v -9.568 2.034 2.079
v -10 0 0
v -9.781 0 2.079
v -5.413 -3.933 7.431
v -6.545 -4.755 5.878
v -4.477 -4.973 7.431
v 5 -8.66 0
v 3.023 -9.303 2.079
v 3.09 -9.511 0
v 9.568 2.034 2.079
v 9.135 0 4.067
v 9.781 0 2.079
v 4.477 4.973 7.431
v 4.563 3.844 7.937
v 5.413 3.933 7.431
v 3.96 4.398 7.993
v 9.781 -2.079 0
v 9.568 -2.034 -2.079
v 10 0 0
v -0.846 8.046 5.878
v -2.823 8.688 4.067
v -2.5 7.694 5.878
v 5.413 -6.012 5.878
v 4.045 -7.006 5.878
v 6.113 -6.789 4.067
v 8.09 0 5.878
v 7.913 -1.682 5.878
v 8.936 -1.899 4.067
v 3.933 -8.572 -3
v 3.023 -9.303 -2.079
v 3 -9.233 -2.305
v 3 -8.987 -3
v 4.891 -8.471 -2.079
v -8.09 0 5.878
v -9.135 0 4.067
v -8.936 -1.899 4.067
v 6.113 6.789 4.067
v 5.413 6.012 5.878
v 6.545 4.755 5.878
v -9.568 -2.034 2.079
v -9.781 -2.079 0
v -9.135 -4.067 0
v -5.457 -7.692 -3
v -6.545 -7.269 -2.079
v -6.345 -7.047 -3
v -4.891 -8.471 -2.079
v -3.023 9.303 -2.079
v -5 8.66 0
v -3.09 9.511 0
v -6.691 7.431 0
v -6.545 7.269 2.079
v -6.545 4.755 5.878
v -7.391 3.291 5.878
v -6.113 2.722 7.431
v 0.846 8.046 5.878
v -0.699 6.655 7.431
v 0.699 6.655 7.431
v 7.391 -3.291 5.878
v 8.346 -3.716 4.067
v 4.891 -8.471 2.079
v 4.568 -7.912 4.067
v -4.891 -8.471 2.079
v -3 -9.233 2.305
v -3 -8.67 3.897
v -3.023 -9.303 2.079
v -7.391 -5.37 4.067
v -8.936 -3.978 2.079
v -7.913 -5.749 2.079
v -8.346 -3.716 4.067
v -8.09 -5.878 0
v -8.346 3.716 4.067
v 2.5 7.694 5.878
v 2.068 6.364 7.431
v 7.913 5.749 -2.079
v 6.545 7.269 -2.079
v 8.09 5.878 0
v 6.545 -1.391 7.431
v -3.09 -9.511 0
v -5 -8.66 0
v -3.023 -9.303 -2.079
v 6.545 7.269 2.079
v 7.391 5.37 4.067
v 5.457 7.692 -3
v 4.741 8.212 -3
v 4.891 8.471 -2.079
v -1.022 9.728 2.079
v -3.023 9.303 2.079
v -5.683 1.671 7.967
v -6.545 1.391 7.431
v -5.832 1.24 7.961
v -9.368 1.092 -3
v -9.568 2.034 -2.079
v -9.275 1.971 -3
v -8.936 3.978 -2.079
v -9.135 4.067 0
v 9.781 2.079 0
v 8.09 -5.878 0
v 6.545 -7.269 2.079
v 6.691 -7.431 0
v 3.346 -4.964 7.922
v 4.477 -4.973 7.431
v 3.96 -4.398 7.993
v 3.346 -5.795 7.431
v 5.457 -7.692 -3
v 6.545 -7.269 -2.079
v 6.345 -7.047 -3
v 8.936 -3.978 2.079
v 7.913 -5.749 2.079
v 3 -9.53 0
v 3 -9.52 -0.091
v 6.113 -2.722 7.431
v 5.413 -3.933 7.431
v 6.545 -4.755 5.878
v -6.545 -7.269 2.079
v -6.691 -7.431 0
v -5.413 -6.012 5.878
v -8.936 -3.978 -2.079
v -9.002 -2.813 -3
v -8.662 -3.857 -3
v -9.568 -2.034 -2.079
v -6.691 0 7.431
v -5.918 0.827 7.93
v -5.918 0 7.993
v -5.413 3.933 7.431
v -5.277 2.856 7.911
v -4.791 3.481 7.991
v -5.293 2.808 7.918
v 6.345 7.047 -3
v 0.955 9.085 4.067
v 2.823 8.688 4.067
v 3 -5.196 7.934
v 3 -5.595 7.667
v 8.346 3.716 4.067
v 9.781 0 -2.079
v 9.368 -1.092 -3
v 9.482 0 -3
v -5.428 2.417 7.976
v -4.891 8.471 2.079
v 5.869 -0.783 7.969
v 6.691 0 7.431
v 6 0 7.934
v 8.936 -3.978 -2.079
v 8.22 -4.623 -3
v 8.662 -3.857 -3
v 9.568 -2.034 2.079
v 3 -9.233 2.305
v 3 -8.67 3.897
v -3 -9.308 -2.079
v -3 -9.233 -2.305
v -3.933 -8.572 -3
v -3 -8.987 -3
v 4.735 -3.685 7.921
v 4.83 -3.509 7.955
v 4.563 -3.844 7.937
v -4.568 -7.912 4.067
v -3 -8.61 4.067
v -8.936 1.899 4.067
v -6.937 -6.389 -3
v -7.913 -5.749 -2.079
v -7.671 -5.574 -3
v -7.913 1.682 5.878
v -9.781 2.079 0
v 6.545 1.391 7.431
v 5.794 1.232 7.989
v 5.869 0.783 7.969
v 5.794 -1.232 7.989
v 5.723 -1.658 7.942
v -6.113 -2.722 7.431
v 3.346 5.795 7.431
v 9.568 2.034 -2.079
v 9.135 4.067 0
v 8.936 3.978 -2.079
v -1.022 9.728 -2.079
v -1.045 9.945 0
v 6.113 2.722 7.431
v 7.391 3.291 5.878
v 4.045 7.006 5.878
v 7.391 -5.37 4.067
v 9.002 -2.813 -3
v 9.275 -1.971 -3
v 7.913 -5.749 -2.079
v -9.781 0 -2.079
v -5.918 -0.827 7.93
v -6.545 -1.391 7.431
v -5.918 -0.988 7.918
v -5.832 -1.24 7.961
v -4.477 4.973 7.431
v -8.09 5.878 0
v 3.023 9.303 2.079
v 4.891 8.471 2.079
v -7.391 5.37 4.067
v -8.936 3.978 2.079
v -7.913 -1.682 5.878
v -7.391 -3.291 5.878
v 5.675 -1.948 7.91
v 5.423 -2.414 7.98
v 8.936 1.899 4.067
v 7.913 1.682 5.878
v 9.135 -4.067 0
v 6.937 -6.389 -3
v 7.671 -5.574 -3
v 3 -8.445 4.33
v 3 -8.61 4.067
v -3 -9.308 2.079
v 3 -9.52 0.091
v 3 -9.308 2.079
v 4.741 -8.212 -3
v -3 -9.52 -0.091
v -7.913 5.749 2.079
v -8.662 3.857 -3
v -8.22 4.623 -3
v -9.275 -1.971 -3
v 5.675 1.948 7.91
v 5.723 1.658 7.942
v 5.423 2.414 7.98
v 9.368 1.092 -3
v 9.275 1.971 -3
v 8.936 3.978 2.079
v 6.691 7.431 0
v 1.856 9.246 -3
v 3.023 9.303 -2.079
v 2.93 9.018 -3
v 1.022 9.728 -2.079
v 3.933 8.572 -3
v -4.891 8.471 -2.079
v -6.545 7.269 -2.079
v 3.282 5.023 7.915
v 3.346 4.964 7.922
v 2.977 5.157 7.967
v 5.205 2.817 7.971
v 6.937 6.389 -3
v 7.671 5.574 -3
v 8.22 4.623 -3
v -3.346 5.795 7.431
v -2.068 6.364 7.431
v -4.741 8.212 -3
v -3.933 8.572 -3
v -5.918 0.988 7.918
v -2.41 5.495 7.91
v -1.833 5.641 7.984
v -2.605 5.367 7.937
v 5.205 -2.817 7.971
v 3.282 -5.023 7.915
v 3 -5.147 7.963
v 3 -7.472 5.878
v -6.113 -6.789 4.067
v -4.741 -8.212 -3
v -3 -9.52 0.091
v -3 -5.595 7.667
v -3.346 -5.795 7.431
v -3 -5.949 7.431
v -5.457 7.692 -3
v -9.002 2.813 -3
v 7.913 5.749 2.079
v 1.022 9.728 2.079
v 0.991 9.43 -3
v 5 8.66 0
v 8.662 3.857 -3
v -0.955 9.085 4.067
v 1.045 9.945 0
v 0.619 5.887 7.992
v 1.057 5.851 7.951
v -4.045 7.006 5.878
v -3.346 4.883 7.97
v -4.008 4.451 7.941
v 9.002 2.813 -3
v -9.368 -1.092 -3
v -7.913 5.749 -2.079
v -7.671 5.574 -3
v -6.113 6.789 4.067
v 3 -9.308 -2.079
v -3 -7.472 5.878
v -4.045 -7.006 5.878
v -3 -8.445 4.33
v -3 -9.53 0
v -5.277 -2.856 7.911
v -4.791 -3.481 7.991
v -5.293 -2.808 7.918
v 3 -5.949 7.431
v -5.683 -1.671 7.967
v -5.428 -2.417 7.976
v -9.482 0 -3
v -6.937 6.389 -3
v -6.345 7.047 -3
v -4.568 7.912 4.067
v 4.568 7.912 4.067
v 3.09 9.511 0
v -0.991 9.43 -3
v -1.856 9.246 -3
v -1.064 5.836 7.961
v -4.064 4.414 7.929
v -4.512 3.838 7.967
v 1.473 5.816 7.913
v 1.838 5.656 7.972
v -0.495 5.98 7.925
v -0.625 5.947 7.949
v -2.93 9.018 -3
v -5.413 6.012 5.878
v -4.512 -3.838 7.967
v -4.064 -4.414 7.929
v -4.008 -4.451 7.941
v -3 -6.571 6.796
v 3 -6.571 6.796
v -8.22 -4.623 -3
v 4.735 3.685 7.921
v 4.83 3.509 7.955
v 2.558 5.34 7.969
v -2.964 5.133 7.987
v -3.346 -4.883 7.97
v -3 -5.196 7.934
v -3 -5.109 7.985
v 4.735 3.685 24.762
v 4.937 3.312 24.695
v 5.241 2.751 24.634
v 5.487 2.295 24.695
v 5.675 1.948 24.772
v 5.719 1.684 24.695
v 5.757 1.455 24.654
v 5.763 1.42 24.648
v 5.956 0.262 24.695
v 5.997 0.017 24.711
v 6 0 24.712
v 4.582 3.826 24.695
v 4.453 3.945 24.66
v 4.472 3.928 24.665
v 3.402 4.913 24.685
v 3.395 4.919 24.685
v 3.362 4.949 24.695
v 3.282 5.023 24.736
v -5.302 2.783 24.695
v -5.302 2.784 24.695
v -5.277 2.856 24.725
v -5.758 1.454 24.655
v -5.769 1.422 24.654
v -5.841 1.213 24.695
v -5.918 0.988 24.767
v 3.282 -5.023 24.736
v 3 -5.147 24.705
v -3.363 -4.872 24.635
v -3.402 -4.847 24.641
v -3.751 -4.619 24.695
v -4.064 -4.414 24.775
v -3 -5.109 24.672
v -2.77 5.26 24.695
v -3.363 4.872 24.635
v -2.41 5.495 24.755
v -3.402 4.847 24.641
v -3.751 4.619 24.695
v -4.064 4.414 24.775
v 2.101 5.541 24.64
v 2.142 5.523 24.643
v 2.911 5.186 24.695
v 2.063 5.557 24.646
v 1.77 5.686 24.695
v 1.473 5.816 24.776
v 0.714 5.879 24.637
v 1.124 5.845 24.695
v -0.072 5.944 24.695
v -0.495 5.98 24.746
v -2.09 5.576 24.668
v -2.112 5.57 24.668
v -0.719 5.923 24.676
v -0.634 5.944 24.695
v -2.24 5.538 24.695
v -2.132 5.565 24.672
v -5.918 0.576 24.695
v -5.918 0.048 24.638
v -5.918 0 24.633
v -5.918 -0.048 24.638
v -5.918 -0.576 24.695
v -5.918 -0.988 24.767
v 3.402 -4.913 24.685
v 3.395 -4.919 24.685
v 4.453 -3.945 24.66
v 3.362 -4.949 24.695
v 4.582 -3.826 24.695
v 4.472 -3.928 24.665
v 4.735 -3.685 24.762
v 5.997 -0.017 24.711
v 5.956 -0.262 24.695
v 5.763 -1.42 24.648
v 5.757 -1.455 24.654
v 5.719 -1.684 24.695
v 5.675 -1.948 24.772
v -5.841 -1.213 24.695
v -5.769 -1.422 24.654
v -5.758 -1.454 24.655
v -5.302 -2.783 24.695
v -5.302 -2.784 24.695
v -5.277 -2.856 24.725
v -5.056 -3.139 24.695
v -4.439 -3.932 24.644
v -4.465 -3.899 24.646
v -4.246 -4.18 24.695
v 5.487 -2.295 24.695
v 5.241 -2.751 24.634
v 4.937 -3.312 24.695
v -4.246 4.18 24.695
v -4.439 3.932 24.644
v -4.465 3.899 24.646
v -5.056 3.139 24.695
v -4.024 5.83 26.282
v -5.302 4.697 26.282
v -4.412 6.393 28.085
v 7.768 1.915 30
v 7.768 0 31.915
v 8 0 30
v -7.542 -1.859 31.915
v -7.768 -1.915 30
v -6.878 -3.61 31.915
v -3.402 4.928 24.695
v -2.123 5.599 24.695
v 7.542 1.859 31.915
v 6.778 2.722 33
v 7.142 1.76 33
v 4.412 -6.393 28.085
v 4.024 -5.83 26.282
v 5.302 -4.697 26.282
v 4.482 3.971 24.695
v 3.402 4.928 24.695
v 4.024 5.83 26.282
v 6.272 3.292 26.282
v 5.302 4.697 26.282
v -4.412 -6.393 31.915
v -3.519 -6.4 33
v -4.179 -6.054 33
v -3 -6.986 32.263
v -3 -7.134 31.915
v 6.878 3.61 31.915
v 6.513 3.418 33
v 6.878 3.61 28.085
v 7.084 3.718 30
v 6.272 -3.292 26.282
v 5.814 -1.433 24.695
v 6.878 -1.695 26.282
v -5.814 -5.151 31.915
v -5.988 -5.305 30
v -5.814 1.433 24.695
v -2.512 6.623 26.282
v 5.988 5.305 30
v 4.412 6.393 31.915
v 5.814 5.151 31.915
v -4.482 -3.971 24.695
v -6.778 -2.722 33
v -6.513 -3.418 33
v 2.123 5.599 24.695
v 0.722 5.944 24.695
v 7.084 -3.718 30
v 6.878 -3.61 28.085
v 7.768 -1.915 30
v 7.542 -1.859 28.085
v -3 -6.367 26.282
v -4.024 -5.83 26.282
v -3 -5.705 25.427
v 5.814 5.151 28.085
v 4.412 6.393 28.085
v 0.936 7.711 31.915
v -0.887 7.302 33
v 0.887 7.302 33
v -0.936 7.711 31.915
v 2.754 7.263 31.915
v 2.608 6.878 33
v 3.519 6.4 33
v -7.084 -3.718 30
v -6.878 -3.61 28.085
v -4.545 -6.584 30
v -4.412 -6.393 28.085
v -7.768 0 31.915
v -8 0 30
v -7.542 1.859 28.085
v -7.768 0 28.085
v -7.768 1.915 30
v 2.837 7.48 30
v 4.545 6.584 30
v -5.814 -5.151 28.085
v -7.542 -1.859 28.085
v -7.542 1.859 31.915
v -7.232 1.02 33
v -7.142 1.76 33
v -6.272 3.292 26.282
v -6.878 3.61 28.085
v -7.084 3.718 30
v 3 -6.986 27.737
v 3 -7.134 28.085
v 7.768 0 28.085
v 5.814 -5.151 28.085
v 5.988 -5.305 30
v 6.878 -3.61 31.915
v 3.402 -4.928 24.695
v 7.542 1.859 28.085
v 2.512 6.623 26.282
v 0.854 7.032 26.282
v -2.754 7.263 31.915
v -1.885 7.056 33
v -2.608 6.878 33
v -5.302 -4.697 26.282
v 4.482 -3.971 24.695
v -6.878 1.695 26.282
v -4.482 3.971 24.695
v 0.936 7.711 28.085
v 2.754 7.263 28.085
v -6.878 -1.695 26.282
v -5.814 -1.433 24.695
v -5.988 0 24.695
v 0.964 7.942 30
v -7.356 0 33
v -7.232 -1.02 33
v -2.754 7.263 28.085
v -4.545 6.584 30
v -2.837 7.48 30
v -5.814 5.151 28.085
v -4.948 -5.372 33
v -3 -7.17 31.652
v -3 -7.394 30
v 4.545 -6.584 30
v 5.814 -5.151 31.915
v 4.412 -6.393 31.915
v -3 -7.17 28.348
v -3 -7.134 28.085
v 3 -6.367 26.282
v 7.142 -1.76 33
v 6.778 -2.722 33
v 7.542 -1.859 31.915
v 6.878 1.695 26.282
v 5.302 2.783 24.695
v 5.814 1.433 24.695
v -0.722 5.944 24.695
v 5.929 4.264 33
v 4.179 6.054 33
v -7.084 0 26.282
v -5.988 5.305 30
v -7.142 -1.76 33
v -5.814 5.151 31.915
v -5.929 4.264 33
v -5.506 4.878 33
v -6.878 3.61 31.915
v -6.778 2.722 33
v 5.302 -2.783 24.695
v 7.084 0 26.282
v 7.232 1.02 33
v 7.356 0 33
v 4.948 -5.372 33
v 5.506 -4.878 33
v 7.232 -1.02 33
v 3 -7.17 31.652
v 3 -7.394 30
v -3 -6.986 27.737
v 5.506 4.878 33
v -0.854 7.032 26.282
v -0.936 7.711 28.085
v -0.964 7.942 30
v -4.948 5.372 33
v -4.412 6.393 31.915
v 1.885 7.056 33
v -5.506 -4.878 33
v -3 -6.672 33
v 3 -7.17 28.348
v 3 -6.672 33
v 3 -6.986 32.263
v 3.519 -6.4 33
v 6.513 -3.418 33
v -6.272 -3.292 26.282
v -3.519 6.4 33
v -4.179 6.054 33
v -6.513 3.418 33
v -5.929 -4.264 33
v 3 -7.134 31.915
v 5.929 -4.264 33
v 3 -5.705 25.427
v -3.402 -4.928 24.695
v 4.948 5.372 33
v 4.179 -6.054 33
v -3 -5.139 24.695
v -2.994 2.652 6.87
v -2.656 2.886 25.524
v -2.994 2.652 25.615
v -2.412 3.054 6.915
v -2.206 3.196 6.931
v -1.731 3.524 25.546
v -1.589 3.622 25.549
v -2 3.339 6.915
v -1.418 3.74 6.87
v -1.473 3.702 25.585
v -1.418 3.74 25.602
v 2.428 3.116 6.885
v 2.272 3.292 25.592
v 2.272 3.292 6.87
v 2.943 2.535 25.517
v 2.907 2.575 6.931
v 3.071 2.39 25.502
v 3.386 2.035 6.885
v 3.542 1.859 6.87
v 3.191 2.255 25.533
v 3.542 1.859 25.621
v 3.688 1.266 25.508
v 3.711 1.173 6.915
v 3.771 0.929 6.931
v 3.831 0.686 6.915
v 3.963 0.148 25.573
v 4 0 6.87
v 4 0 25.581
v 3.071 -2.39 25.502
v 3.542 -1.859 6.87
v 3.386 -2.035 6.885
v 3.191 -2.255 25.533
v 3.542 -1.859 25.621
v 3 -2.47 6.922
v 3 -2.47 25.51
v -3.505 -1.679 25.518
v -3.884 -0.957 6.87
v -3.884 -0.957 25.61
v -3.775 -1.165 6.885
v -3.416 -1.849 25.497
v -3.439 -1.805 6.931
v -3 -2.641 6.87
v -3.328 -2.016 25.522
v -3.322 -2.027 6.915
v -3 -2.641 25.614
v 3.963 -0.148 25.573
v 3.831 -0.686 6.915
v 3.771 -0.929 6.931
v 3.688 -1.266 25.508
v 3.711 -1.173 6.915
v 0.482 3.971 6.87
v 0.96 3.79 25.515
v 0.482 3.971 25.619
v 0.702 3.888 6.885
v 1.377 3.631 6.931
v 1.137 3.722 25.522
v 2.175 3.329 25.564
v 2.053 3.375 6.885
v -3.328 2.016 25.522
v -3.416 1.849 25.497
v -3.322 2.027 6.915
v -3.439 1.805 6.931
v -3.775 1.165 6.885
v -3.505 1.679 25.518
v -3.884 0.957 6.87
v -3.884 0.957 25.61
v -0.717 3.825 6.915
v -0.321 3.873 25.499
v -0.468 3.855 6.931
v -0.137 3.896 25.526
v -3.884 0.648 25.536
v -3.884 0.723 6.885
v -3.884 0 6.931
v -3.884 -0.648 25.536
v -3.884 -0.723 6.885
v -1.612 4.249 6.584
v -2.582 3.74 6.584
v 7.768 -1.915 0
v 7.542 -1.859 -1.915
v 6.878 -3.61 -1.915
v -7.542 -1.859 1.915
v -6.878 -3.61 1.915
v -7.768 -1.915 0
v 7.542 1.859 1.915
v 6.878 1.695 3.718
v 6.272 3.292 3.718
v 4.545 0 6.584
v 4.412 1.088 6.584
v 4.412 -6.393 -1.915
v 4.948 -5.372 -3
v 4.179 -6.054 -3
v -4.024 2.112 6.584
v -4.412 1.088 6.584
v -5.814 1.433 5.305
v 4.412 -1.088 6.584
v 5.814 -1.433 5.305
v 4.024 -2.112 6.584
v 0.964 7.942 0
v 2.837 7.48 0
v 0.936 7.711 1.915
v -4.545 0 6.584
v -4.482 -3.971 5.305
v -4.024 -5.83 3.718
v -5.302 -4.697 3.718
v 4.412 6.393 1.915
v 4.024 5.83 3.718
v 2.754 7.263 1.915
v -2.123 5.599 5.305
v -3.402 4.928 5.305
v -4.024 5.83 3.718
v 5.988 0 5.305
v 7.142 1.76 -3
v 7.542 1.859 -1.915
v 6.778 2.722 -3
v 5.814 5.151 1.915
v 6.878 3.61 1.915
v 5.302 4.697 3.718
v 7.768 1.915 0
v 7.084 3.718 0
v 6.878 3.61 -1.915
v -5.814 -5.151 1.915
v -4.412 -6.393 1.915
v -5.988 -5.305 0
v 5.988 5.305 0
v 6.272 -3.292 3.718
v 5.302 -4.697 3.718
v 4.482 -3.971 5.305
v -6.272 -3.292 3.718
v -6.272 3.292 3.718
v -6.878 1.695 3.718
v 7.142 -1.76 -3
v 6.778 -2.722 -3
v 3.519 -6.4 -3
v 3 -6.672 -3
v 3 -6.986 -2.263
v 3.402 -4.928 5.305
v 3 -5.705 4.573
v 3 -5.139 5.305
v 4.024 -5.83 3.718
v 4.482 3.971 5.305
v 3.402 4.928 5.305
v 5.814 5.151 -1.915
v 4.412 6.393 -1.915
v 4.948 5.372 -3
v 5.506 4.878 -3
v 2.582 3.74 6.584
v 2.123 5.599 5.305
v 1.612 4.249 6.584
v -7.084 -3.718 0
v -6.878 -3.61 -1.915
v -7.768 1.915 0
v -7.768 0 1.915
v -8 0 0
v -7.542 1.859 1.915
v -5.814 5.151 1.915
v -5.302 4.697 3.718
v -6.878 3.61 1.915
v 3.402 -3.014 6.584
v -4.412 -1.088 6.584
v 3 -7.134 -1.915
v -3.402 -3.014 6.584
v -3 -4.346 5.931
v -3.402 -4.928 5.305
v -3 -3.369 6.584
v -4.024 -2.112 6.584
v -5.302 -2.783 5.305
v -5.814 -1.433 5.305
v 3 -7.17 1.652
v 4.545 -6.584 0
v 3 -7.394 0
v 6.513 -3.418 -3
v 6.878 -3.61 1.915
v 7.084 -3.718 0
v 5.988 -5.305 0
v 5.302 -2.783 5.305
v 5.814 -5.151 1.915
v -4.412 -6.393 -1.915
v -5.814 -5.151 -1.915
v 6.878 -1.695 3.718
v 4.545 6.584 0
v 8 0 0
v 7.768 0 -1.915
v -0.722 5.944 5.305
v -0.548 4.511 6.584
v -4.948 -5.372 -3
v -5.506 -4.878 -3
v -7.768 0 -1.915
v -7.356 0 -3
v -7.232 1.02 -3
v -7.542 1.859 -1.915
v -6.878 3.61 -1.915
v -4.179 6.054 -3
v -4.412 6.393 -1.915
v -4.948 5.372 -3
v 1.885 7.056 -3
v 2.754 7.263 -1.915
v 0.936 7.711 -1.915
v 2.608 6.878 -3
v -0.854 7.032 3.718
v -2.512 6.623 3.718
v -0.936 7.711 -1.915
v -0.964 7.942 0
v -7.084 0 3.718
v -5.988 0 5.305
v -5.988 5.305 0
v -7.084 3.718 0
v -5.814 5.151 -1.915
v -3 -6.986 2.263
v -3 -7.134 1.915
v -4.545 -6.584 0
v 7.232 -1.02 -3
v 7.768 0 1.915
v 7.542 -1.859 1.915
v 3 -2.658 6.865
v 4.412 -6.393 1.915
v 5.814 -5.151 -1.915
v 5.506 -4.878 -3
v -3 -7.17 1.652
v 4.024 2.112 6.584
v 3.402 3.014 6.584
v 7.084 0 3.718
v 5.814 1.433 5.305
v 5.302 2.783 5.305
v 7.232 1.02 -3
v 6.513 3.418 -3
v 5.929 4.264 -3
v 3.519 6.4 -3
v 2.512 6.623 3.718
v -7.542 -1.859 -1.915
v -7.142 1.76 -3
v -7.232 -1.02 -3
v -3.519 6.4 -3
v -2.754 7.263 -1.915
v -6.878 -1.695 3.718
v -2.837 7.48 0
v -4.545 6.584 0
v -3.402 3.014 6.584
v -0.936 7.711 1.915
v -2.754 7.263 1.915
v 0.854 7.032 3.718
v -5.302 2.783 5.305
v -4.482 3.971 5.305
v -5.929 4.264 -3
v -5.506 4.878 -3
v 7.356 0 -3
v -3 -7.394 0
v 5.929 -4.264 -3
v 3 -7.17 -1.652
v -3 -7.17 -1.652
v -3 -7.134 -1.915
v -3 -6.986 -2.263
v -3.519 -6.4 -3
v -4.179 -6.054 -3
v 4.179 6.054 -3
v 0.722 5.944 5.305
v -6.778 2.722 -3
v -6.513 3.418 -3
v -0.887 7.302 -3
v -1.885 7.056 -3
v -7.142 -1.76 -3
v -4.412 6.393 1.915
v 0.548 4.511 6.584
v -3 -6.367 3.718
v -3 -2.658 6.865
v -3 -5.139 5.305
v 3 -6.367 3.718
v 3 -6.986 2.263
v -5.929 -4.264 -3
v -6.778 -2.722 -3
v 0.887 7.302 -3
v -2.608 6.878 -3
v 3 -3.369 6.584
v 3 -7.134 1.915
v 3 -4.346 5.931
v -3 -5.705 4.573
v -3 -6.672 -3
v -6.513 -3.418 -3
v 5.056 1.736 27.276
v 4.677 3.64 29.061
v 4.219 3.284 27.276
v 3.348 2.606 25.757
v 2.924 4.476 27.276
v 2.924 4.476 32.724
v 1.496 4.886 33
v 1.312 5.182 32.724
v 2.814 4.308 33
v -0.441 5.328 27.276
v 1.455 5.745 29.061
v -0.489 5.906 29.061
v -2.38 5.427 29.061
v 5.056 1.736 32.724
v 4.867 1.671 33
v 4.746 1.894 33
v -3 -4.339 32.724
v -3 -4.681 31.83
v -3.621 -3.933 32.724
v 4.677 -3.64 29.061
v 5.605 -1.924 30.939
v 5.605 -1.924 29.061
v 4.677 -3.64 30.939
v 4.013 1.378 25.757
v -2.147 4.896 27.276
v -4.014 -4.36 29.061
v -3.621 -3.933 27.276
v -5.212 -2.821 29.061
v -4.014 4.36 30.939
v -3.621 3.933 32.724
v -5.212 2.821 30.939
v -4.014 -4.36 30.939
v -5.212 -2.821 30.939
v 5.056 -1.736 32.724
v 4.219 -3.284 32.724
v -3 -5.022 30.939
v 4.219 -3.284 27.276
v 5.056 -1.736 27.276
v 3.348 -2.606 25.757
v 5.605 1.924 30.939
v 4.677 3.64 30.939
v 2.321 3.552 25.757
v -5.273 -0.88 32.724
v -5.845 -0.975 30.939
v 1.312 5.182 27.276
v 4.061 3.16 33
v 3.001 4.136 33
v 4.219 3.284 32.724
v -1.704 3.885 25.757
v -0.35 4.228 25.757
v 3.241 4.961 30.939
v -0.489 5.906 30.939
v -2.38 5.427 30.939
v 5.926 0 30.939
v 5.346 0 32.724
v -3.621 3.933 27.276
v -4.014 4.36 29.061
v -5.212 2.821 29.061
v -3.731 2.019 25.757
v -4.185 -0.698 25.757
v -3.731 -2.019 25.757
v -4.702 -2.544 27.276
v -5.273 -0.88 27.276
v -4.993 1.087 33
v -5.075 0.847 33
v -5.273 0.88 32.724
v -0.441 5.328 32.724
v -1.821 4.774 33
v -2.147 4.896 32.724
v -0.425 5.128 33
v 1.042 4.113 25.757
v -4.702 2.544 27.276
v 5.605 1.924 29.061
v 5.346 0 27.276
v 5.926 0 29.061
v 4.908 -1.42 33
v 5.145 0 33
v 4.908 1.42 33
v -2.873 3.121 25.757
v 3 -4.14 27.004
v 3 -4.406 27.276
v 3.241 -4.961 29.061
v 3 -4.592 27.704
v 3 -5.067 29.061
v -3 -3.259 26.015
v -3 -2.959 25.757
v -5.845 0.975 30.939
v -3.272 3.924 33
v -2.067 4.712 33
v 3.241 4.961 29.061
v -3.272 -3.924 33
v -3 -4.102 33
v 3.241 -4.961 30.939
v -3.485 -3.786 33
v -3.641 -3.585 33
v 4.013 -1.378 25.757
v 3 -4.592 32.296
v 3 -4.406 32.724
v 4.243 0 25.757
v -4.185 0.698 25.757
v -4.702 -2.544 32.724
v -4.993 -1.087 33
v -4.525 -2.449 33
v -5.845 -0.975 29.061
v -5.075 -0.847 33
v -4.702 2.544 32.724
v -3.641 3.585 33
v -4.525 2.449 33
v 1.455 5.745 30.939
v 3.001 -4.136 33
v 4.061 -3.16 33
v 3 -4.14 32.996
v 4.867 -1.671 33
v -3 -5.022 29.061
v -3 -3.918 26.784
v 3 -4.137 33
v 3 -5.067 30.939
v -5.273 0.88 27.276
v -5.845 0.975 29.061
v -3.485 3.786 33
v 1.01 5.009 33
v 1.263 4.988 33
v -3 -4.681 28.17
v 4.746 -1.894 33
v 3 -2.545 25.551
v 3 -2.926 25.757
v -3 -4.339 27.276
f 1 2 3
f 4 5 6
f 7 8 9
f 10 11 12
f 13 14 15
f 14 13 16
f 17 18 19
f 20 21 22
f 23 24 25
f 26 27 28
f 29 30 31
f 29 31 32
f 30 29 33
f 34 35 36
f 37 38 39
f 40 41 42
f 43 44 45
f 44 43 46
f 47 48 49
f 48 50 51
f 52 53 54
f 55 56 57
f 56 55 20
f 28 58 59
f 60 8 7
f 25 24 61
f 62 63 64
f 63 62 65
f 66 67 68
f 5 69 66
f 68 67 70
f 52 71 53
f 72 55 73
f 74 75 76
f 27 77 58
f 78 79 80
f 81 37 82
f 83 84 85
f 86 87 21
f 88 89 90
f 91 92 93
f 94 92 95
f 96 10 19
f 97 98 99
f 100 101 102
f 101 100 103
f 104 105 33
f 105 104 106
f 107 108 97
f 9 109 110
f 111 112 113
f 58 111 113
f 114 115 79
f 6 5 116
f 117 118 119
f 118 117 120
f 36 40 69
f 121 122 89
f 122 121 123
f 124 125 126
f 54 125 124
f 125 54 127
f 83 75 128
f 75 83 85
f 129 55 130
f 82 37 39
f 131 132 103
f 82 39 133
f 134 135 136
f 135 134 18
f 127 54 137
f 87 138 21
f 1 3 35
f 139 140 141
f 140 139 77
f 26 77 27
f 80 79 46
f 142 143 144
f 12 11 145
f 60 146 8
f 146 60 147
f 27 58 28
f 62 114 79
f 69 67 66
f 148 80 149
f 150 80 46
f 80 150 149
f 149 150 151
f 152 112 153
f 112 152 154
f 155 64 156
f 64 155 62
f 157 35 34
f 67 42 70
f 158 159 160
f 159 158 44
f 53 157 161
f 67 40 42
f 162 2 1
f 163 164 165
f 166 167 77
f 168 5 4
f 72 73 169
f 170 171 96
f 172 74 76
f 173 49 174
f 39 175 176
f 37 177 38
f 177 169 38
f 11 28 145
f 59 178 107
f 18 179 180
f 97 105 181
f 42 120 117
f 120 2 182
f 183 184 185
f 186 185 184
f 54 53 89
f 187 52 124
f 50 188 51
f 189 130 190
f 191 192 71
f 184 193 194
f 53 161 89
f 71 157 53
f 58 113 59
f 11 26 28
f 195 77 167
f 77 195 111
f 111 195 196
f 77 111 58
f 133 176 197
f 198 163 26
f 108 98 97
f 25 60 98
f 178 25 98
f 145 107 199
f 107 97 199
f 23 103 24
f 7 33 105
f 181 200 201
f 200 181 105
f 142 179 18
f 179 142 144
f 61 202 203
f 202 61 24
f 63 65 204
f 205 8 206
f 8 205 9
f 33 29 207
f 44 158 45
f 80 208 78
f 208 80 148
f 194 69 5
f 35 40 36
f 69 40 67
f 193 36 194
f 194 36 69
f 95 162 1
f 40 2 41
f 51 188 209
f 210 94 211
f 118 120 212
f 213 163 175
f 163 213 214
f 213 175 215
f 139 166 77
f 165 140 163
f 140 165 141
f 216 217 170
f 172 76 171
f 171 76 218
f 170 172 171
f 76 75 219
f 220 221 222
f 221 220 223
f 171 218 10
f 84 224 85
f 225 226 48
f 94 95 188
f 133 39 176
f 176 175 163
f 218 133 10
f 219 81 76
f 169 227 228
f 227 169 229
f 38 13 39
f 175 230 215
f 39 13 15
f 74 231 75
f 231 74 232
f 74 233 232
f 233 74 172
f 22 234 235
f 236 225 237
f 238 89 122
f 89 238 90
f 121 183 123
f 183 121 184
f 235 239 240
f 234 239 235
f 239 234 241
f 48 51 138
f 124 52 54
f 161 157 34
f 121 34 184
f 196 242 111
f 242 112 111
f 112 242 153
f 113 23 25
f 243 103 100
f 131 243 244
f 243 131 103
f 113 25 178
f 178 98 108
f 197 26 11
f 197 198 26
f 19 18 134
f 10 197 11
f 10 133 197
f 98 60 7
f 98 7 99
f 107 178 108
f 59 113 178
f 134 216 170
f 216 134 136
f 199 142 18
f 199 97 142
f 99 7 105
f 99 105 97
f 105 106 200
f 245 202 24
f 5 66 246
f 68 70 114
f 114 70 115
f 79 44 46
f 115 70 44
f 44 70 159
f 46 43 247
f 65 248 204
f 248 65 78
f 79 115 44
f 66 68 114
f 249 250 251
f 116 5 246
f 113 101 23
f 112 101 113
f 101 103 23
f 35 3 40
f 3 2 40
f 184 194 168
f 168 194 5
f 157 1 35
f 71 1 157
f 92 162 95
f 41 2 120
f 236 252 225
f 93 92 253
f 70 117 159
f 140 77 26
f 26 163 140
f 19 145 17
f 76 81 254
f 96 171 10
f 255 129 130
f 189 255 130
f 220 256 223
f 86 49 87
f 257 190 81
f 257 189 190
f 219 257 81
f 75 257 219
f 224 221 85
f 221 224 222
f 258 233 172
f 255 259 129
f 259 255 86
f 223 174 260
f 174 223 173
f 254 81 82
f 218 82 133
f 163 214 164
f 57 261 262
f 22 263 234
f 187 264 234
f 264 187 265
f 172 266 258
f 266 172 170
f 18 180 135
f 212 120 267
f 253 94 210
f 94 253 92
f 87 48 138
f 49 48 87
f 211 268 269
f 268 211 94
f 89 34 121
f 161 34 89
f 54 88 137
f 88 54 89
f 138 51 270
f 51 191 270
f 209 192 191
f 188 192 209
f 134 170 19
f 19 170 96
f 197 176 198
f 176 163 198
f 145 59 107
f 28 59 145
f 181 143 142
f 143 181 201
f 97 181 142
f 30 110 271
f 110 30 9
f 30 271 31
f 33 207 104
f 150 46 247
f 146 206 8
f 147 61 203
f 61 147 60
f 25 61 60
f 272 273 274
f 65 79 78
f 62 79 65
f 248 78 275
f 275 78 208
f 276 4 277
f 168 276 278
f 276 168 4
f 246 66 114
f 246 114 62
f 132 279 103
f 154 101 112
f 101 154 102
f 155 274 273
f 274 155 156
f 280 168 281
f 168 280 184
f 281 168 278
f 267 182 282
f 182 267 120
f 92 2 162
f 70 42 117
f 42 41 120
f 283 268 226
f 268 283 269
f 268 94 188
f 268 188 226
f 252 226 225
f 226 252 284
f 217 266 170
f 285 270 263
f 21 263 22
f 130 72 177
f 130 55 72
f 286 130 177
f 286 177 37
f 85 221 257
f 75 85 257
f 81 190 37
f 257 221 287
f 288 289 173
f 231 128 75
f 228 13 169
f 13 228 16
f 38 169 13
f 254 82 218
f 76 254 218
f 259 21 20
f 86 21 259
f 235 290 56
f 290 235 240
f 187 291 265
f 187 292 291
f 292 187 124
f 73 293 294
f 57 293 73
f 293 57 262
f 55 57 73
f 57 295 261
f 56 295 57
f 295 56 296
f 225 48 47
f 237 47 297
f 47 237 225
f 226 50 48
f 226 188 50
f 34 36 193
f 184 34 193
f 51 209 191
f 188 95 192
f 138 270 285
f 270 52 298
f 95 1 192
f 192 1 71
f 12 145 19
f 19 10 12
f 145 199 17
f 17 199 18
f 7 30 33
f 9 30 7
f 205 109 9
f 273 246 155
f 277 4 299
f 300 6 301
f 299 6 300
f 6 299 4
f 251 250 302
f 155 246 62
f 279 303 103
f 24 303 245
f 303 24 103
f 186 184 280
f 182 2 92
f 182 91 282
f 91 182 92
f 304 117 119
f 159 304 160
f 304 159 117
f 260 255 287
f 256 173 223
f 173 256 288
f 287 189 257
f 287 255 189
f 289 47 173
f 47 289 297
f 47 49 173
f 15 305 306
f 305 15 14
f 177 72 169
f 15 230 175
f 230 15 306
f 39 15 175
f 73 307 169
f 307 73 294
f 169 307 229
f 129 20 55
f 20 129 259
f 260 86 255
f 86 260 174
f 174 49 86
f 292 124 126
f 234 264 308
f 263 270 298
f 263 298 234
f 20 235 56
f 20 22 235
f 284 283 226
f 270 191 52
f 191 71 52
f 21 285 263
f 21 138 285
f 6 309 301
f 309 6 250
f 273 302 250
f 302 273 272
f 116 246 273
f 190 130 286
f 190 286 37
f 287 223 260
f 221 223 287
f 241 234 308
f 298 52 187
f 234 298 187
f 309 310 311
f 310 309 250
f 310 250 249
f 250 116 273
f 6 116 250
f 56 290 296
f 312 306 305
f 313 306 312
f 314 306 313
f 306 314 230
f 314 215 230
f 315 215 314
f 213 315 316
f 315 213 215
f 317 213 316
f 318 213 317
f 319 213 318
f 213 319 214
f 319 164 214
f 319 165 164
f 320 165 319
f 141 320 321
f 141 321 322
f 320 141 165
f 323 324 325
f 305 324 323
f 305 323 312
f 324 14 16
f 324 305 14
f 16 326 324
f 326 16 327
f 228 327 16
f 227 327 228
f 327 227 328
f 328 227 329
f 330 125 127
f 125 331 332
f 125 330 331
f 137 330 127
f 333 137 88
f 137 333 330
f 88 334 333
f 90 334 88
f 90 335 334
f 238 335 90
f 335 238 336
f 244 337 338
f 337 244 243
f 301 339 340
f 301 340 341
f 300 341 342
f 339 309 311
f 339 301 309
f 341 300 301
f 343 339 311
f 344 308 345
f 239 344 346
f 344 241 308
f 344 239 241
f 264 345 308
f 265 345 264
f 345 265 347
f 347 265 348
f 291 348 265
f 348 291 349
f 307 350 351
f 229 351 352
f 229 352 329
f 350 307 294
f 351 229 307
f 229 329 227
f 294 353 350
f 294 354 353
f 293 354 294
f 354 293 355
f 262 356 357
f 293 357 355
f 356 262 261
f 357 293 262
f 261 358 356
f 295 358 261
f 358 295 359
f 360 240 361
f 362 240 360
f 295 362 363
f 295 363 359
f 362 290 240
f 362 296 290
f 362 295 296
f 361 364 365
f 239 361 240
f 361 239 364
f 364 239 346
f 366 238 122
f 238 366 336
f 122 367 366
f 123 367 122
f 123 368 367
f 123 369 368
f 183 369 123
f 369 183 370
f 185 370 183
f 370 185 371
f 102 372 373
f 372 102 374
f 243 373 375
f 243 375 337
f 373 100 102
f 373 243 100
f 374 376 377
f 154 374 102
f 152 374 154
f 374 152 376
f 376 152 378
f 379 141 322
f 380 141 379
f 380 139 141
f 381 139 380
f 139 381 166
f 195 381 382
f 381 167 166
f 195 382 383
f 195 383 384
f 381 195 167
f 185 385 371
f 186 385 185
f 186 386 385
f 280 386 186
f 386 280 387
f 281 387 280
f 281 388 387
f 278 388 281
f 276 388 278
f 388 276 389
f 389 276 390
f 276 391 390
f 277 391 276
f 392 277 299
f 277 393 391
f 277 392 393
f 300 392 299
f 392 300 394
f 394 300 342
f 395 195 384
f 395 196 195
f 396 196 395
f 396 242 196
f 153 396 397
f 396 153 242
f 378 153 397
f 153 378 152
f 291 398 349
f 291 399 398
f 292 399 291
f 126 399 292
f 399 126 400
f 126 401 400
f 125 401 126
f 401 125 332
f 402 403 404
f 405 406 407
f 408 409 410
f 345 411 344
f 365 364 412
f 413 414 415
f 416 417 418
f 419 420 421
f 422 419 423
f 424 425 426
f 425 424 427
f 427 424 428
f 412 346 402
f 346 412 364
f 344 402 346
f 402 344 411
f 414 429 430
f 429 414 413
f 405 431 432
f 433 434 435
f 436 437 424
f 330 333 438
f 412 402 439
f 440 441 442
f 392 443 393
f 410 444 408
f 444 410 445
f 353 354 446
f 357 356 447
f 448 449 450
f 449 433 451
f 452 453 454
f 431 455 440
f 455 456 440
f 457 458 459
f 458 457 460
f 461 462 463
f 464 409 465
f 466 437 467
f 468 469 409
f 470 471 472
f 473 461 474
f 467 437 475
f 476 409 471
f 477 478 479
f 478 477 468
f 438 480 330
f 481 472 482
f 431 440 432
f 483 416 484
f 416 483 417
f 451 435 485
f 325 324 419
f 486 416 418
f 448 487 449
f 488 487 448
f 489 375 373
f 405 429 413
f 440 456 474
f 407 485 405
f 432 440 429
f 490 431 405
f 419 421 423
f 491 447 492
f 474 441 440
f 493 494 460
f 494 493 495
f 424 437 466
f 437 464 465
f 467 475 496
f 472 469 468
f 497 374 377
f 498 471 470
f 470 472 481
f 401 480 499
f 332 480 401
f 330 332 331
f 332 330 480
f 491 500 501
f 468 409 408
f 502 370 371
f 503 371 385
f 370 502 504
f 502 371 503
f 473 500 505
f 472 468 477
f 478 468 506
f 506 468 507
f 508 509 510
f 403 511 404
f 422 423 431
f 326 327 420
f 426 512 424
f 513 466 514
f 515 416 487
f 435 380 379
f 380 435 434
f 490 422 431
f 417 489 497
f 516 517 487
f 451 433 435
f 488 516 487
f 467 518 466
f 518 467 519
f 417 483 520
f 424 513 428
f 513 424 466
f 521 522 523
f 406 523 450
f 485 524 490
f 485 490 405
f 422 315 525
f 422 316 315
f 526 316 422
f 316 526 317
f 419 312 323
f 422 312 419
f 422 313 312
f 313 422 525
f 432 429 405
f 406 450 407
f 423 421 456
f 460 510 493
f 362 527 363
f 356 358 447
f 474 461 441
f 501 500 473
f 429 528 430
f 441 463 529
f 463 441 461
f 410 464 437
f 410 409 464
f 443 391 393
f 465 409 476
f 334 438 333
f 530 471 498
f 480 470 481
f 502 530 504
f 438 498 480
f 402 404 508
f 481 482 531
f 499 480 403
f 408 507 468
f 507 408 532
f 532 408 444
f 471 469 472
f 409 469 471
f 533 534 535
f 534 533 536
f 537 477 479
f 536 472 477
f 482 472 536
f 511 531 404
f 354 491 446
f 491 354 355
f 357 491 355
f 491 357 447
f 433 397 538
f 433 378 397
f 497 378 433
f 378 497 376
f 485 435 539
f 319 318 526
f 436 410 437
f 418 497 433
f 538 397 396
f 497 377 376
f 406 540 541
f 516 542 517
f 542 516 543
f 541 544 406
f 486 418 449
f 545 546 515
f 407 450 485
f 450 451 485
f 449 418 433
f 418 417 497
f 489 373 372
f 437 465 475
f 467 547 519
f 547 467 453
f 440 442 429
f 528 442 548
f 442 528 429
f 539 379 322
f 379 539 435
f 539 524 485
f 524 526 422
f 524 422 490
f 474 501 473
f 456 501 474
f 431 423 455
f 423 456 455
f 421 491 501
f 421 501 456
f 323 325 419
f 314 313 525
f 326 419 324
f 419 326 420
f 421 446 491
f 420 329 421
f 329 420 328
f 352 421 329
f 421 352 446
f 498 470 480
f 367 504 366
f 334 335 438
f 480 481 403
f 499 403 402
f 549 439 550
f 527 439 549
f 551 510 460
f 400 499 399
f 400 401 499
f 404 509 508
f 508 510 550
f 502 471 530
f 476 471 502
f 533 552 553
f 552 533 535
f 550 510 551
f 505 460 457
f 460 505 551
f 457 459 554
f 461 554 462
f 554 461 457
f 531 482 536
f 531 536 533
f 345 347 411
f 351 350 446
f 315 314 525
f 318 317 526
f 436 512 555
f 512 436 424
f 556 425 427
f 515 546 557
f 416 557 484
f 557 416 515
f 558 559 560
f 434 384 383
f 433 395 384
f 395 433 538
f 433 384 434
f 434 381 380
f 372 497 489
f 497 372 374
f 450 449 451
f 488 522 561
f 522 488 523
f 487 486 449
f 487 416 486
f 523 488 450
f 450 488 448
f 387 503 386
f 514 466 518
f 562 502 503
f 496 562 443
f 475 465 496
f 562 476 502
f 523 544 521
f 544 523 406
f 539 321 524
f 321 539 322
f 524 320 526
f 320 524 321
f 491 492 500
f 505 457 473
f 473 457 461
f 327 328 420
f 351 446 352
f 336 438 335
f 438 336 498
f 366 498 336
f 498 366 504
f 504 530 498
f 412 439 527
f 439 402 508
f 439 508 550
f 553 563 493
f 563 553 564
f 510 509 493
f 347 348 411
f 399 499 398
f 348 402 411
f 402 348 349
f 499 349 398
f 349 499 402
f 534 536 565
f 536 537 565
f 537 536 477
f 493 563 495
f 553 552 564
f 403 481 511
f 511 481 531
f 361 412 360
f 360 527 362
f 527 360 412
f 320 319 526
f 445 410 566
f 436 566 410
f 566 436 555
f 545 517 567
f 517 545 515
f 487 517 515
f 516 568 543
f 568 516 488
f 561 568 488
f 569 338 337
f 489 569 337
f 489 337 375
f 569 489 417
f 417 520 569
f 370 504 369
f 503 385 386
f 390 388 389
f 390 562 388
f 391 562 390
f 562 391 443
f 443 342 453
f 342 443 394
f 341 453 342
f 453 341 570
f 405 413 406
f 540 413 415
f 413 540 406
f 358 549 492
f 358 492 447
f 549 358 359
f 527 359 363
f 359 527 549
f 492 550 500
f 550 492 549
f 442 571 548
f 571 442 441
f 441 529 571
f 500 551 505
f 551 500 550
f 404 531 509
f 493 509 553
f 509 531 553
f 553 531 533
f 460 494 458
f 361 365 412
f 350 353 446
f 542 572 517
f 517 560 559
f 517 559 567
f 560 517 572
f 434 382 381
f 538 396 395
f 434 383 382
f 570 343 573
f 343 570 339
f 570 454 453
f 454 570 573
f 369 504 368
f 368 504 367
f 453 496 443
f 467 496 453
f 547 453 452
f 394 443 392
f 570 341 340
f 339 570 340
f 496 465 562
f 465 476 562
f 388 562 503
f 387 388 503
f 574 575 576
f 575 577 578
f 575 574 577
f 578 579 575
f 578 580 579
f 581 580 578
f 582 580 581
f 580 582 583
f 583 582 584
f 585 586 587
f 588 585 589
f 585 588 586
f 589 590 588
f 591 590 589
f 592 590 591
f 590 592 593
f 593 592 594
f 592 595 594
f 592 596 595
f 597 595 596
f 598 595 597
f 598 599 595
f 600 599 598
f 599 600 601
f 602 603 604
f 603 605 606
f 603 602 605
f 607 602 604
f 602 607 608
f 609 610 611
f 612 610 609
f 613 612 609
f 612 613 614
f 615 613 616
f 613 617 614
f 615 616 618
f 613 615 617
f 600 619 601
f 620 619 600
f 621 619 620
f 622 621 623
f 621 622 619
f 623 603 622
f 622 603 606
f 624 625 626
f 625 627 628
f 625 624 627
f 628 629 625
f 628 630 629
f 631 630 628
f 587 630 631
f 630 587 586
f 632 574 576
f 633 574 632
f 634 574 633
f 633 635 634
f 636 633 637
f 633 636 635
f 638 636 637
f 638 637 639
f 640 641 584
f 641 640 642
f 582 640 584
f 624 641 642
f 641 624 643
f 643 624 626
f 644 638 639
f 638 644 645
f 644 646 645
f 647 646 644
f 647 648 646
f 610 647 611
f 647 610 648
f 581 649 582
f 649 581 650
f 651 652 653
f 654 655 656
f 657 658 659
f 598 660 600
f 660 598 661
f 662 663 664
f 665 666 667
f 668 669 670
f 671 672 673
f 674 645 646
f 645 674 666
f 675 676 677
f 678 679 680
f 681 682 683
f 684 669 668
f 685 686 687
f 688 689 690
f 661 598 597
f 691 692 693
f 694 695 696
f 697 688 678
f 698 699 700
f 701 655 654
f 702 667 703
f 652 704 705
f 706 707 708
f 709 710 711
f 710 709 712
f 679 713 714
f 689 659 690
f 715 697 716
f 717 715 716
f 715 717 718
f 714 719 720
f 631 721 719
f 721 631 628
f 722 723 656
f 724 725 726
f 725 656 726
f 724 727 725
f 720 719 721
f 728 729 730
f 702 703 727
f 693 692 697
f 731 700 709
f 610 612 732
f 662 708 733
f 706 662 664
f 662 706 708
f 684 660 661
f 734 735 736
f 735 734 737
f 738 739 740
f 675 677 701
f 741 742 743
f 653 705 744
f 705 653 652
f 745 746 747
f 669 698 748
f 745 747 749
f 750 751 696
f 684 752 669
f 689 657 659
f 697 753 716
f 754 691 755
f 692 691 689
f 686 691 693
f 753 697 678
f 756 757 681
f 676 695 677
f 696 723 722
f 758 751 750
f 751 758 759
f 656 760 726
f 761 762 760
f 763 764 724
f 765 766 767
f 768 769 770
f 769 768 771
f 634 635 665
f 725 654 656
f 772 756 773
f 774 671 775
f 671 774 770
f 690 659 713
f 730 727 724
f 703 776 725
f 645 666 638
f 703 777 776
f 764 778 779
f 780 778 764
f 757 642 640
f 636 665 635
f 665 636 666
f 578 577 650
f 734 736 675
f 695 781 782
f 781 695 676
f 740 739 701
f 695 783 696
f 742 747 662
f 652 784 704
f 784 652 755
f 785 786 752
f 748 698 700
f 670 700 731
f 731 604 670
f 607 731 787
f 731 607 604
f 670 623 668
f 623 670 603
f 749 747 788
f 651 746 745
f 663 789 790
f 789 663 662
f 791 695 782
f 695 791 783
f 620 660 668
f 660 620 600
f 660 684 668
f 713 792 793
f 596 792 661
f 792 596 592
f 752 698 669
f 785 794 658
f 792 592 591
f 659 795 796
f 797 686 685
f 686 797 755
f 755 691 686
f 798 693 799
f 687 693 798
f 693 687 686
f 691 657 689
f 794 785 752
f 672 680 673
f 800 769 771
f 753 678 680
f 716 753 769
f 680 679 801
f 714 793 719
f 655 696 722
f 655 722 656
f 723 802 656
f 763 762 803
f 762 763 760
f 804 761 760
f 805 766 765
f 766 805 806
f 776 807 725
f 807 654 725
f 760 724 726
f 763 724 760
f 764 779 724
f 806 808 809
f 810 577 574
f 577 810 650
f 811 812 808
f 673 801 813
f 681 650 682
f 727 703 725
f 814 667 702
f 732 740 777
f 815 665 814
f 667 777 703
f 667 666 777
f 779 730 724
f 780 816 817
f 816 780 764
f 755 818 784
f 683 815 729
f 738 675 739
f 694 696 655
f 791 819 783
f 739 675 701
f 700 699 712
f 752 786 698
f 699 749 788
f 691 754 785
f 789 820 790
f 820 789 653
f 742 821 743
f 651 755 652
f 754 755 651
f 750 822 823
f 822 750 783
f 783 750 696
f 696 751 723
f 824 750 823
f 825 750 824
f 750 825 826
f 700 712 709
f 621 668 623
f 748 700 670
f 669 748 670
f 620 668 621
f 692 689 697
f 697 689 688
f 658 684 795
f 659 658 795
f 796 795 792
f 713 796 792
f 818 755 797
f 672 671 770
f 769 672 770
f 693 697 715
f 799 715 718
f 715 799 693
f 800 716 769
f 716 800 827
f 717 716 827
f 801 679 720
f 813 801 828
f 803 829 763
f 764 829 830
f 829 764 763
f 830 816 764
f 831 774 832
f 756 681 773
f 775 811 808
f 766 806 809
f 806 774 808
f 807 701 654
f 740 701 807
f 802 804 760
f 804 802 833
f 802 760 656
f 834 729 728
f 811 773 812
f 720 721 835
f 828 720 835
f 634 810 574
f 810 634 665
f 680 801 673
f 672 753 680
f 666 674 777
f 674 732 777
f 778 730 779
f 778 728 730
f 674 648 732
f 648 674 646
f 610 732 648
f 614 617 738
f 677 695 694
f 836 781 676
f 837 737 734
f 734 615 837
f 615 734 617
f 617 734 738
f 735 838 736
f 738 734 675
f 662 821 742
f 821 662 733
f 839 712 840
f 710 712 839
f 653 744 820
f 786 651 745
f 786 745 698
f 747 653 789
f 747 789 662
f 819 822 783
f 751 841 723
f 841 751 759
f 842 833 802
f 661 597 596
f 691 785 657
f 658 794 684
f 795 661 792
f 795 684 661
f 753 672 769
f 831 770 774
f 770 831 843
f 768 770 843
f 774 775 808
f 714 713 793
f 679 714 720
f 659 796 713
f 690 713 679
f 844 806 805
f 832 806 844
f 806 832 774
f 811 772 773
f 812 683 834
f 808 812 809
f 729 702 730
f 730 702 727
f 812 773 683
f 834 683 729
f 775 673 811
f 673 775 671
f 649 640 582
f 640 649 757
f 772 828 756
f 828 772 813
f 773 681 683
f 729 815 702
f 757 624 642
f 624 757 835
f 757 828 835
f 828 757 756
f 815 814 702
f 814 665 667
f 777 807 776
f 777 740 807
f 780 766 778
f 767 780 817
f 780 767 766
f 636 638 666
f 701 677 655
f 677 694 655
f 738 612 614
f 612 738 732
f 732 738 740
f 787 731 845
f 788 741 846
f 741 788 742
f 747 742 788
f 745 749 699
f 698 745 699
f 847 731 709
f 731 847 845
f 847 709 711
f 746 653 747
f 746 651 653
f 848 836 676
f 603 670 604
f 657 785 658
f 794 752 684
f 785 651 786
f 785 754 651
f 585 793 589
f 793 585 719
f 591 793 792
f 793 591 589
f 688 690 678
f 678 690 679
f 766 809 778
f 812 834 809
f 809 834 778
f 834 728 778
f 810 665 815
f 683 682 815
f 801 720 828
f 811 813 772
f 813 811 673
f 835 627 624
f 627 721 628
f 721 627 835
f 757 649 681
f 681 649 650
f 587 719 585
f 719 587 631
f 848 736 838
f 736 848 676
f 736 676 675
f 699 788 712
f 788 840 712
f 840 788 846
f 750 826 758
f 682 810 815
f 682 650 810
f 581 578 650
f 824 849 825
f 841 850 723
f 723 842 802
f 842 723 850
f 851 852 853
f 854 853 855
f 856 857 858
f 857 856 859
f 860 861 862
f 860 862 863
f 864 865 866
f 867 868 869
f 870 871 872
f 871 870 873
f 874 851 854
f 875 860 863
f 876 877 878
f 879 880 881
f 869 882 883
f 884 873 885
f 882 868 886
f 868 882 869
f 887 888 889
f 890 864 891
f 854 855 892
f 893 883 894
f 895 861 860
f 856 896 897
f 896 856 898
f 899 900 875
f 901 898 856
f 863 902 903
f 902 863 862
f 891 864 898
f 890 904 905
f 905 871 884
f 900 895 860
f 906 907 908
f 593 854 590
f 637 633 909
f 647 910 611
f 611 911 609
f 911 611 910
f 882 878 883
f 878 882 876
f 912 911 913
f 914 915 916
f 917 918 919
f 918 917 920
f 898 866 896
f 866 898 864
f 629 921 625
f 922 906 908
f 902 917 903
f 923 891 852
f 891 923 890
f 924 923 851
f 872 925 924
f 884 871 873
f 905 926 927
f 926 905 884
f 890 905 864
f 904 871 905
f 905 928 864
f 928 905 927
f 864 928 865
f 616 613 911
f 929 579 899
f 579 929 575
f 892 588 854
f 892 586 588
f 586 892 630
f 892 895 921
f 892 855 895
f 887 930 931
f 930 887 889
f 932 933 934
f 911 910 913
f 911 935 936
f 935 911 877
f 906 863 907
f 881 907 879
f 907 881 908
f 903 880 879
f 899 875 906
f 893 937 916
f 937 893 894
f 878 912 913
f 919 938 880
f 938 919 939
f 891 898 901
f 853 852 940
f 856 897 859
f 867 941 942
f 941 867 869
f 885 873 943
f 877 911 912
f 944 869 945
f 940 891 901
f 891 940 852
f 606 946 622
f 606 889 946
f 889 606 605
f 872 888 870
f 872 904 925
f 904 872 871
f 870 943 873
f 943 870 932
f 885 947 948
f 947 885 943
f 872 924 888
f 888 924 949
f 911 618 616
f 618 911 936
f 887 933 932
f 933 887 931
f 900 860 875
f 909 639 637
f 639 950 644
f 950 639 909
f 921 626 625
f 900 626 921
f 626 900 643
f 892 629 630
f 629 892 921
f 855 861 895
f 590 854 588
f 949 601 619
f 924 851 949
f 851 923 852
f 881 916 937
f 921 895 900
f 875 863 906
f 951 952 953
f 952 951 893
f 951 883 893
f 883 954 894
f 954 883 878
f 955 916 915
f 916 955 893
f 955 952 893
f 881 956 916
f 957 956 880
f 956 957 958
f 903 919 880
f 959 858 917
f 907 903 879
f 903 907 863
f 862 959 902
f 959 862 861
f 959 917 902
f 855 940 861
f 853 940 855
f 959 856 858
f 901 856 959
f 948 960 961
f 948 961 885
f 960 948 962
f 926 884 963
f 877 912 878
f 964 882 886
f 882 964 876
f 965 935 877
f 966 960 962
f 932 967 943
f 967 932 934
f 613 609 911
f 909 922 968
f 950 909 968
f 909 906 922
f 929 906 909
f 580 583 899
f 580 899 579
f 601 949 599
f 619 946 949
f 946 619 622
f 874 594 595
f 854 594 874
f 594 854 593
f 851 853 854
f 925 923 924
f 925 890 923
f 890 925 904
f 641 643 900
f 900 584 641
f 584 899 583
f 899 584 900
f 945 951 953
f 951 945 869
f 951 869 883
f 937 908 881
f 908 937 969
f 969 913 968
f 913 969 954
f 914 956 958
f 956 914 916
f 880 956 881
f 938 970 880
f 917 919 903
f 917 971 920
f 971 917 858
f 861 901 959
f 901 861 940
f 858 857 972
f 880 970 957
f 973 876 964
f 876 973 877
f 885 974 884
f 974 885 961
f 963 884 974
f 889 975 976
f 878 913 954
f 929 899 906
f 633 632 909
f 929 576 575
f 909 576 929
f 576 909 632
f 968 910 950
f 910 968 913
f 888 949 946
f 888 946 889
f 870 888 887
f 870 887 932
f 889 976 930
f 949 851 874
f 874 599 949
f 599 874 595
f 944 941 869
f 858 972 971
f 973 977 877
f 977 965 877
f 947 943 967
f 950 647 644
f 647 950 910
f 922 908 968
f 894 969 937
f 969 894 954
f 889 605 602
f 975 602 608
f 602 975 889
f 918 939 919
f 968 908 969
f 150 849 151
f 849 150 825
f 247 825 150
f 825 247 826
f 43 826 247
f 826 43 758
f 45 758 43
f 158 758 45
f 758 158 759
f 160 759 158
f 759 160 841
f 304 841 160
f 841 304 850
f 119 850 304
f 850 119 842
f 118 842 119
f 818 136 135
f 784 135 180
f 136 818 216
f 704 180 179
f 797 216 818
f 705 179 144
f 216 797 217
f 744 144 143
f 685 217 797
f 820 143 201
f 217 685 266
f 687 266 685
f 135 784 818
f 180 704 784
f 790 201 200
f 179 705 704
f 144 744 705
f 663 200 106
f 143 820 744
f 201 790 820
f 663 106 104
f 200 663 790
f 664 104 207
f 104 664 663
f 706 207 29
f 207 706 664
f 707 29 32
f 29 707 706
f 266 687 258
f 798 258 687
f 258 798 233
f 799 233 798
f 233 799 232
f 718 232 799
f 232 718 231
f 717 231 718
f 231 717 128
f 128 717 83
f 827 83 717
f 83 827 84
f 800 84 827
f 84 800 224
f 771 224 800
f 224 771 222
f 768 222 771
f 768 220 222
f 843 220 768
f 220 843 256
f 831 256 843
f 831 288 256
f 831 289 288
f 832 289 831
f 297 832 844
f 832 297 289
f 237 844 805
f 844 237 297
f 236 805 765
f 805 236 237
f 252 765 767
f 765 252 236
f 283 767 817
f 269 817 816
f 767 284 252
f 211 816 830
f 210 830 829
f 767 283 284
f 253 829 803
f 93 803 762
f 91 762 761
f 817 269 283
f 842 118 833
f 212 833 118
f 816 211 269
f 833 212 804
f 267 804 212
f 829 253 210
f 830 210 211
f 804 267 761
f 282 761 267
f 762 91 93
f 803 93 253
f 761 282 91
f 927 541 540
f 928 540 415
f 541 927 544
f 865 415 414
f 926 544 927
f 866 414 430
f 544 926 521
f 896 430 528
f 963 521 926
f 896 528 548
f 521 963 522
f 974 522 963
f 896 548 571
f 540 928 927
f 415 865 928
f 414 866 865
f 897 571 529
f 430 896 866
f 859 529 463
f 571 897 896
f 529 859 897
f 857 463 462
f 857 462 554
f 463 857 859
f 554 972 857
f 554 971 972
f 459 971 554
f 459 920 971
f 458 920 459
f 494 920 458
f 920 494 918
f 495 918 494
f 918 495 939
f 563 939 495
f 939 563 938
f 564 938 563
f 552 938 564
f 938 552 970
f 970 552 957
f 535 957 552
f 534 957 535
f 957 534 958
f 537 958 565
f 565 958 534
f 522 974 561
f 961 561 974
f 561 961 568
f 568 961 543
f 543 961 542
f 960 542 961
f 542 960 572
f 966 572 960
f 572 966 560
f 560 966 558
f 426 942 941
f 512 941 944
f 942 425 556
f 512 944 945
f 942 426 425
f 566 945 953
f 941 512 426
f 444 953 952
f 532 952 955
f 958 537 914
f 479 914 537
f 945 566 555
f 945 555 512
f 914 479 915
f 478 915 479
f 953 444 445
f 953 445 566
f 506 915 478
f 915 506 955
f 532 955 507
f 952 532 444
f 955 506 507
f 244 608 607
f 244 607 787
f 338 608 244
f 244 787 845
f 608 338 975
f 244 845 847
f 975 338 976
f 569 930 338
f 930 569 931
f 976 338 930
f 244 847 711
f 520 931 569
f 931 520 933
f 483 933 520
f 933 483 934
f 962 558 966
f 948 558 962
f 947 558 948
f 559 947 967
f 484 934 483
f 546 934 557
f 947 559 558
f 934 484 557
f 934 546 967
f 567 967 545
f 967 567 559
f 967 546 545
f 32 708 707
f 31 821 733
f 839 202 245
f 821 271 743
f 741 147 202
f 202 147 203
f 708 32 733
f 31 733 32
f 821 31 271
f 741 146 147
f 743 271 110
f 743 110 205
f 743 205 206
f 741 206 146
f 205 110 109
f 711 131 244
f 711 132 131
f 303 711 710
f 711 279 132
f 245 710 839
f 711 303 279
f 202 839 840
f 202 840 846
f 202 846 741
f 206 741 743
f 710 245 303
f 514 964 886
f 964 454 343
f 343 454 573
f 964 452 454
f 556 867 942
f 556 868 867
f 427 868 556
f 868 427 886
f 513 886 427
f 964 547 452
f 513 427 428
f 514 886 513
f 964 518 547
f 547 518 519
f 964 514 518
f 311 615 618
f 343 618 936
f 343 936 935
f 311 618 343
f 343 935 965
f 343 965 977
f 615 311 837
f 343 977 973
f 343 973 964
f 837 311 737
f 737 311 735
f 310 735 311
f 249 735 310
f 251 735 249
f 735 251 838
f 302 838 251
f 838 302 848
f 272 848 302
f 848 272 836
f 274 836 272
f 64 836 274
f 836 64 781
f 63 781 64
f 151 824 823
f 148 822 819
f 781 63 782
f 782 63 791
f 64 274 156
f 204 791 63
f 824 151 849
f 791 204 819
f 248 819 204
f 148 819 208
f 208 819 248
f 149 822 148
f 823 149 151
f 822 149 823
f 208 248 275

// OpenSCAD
//This is the height from the center of the large ball to the cente of the small ball, not the overall height of the object.
//Height of the shaft, not the full object
height=30; //[10:50]

//This is the reidus of the inner pipe (The amount of space you have to run cables.
//Inner Pipe radius
inner_pipe_radius=4;//[2:10] 

//This is the outer raidus of the small joint and the inner raidus of the outter joint.
//Outer joint size of the small ball joint and inner joint size of the large ball joint.
large_joint_inner_radius=8;//[4:12]

// How thick are the walls.
// Thickness of the walls
thickness=2;//[1:5]

difference(){
	union(){
		//The large ball joint, outter
		sphere(large_joint_inner_radius+thickness);

		//The outter shaft
		cylinder(h=height,r=inner_pipe_radius+thickness);

		//The small ball joint, outter
		translate([0,0,height]) sphere(large_joint_inner_radius);
	}

	//This cuts the inner pipe.  The place for the cables
	cylinder(h=height,r=inner_pipe_radius);
	
	//This cuts the inner part of the large ball joint
	sphere(large_joint_inner_radius);

	//This cuts the inner part of the small ball joint
	translate([0,0,height]) sphere(large_joint_inner_radius-thickness);

	//This cuts the bottom of the large outter joint
	translate([-large_joint_inner_radius-thickness,-large_joint_inner_radius-thickness,-large_joint_inner_radius-thickness]) cube([(large_joint_inner_radius+thickness)*2,(large_joint_inner_radius+thickness)*2,(large_joint_inner_radius+thickness)*.7]);

	//This cuts the top of the small inner joint.  Needed a little more than calculated.  Needed to be a little more then calculated.
	translate([-large_joint_inner_radius,-large_joint_inner_radius,height+((large_joint_inner_radius+thickness)*.3)]) cube([large_joint_inner_radius*2,large_joint_inner_radius*2,(large_joint_inner_radius*2)]);
	
	//This is the slot
	translate([-inner_pipe_radius+(thickness/2),-large_joint_inner_radius-thickness,-large_joint_inner_radius-thickness]) cube([(inner_pipe_radius*2)-thickness,large_joint_inner_radius+thickness,height+((large_joint_inner_radius+thickness)*2)]) cube([((large_joint_inner_radius+thickness)*.7)+(large_joint_inner_radius*.7)]);
}
